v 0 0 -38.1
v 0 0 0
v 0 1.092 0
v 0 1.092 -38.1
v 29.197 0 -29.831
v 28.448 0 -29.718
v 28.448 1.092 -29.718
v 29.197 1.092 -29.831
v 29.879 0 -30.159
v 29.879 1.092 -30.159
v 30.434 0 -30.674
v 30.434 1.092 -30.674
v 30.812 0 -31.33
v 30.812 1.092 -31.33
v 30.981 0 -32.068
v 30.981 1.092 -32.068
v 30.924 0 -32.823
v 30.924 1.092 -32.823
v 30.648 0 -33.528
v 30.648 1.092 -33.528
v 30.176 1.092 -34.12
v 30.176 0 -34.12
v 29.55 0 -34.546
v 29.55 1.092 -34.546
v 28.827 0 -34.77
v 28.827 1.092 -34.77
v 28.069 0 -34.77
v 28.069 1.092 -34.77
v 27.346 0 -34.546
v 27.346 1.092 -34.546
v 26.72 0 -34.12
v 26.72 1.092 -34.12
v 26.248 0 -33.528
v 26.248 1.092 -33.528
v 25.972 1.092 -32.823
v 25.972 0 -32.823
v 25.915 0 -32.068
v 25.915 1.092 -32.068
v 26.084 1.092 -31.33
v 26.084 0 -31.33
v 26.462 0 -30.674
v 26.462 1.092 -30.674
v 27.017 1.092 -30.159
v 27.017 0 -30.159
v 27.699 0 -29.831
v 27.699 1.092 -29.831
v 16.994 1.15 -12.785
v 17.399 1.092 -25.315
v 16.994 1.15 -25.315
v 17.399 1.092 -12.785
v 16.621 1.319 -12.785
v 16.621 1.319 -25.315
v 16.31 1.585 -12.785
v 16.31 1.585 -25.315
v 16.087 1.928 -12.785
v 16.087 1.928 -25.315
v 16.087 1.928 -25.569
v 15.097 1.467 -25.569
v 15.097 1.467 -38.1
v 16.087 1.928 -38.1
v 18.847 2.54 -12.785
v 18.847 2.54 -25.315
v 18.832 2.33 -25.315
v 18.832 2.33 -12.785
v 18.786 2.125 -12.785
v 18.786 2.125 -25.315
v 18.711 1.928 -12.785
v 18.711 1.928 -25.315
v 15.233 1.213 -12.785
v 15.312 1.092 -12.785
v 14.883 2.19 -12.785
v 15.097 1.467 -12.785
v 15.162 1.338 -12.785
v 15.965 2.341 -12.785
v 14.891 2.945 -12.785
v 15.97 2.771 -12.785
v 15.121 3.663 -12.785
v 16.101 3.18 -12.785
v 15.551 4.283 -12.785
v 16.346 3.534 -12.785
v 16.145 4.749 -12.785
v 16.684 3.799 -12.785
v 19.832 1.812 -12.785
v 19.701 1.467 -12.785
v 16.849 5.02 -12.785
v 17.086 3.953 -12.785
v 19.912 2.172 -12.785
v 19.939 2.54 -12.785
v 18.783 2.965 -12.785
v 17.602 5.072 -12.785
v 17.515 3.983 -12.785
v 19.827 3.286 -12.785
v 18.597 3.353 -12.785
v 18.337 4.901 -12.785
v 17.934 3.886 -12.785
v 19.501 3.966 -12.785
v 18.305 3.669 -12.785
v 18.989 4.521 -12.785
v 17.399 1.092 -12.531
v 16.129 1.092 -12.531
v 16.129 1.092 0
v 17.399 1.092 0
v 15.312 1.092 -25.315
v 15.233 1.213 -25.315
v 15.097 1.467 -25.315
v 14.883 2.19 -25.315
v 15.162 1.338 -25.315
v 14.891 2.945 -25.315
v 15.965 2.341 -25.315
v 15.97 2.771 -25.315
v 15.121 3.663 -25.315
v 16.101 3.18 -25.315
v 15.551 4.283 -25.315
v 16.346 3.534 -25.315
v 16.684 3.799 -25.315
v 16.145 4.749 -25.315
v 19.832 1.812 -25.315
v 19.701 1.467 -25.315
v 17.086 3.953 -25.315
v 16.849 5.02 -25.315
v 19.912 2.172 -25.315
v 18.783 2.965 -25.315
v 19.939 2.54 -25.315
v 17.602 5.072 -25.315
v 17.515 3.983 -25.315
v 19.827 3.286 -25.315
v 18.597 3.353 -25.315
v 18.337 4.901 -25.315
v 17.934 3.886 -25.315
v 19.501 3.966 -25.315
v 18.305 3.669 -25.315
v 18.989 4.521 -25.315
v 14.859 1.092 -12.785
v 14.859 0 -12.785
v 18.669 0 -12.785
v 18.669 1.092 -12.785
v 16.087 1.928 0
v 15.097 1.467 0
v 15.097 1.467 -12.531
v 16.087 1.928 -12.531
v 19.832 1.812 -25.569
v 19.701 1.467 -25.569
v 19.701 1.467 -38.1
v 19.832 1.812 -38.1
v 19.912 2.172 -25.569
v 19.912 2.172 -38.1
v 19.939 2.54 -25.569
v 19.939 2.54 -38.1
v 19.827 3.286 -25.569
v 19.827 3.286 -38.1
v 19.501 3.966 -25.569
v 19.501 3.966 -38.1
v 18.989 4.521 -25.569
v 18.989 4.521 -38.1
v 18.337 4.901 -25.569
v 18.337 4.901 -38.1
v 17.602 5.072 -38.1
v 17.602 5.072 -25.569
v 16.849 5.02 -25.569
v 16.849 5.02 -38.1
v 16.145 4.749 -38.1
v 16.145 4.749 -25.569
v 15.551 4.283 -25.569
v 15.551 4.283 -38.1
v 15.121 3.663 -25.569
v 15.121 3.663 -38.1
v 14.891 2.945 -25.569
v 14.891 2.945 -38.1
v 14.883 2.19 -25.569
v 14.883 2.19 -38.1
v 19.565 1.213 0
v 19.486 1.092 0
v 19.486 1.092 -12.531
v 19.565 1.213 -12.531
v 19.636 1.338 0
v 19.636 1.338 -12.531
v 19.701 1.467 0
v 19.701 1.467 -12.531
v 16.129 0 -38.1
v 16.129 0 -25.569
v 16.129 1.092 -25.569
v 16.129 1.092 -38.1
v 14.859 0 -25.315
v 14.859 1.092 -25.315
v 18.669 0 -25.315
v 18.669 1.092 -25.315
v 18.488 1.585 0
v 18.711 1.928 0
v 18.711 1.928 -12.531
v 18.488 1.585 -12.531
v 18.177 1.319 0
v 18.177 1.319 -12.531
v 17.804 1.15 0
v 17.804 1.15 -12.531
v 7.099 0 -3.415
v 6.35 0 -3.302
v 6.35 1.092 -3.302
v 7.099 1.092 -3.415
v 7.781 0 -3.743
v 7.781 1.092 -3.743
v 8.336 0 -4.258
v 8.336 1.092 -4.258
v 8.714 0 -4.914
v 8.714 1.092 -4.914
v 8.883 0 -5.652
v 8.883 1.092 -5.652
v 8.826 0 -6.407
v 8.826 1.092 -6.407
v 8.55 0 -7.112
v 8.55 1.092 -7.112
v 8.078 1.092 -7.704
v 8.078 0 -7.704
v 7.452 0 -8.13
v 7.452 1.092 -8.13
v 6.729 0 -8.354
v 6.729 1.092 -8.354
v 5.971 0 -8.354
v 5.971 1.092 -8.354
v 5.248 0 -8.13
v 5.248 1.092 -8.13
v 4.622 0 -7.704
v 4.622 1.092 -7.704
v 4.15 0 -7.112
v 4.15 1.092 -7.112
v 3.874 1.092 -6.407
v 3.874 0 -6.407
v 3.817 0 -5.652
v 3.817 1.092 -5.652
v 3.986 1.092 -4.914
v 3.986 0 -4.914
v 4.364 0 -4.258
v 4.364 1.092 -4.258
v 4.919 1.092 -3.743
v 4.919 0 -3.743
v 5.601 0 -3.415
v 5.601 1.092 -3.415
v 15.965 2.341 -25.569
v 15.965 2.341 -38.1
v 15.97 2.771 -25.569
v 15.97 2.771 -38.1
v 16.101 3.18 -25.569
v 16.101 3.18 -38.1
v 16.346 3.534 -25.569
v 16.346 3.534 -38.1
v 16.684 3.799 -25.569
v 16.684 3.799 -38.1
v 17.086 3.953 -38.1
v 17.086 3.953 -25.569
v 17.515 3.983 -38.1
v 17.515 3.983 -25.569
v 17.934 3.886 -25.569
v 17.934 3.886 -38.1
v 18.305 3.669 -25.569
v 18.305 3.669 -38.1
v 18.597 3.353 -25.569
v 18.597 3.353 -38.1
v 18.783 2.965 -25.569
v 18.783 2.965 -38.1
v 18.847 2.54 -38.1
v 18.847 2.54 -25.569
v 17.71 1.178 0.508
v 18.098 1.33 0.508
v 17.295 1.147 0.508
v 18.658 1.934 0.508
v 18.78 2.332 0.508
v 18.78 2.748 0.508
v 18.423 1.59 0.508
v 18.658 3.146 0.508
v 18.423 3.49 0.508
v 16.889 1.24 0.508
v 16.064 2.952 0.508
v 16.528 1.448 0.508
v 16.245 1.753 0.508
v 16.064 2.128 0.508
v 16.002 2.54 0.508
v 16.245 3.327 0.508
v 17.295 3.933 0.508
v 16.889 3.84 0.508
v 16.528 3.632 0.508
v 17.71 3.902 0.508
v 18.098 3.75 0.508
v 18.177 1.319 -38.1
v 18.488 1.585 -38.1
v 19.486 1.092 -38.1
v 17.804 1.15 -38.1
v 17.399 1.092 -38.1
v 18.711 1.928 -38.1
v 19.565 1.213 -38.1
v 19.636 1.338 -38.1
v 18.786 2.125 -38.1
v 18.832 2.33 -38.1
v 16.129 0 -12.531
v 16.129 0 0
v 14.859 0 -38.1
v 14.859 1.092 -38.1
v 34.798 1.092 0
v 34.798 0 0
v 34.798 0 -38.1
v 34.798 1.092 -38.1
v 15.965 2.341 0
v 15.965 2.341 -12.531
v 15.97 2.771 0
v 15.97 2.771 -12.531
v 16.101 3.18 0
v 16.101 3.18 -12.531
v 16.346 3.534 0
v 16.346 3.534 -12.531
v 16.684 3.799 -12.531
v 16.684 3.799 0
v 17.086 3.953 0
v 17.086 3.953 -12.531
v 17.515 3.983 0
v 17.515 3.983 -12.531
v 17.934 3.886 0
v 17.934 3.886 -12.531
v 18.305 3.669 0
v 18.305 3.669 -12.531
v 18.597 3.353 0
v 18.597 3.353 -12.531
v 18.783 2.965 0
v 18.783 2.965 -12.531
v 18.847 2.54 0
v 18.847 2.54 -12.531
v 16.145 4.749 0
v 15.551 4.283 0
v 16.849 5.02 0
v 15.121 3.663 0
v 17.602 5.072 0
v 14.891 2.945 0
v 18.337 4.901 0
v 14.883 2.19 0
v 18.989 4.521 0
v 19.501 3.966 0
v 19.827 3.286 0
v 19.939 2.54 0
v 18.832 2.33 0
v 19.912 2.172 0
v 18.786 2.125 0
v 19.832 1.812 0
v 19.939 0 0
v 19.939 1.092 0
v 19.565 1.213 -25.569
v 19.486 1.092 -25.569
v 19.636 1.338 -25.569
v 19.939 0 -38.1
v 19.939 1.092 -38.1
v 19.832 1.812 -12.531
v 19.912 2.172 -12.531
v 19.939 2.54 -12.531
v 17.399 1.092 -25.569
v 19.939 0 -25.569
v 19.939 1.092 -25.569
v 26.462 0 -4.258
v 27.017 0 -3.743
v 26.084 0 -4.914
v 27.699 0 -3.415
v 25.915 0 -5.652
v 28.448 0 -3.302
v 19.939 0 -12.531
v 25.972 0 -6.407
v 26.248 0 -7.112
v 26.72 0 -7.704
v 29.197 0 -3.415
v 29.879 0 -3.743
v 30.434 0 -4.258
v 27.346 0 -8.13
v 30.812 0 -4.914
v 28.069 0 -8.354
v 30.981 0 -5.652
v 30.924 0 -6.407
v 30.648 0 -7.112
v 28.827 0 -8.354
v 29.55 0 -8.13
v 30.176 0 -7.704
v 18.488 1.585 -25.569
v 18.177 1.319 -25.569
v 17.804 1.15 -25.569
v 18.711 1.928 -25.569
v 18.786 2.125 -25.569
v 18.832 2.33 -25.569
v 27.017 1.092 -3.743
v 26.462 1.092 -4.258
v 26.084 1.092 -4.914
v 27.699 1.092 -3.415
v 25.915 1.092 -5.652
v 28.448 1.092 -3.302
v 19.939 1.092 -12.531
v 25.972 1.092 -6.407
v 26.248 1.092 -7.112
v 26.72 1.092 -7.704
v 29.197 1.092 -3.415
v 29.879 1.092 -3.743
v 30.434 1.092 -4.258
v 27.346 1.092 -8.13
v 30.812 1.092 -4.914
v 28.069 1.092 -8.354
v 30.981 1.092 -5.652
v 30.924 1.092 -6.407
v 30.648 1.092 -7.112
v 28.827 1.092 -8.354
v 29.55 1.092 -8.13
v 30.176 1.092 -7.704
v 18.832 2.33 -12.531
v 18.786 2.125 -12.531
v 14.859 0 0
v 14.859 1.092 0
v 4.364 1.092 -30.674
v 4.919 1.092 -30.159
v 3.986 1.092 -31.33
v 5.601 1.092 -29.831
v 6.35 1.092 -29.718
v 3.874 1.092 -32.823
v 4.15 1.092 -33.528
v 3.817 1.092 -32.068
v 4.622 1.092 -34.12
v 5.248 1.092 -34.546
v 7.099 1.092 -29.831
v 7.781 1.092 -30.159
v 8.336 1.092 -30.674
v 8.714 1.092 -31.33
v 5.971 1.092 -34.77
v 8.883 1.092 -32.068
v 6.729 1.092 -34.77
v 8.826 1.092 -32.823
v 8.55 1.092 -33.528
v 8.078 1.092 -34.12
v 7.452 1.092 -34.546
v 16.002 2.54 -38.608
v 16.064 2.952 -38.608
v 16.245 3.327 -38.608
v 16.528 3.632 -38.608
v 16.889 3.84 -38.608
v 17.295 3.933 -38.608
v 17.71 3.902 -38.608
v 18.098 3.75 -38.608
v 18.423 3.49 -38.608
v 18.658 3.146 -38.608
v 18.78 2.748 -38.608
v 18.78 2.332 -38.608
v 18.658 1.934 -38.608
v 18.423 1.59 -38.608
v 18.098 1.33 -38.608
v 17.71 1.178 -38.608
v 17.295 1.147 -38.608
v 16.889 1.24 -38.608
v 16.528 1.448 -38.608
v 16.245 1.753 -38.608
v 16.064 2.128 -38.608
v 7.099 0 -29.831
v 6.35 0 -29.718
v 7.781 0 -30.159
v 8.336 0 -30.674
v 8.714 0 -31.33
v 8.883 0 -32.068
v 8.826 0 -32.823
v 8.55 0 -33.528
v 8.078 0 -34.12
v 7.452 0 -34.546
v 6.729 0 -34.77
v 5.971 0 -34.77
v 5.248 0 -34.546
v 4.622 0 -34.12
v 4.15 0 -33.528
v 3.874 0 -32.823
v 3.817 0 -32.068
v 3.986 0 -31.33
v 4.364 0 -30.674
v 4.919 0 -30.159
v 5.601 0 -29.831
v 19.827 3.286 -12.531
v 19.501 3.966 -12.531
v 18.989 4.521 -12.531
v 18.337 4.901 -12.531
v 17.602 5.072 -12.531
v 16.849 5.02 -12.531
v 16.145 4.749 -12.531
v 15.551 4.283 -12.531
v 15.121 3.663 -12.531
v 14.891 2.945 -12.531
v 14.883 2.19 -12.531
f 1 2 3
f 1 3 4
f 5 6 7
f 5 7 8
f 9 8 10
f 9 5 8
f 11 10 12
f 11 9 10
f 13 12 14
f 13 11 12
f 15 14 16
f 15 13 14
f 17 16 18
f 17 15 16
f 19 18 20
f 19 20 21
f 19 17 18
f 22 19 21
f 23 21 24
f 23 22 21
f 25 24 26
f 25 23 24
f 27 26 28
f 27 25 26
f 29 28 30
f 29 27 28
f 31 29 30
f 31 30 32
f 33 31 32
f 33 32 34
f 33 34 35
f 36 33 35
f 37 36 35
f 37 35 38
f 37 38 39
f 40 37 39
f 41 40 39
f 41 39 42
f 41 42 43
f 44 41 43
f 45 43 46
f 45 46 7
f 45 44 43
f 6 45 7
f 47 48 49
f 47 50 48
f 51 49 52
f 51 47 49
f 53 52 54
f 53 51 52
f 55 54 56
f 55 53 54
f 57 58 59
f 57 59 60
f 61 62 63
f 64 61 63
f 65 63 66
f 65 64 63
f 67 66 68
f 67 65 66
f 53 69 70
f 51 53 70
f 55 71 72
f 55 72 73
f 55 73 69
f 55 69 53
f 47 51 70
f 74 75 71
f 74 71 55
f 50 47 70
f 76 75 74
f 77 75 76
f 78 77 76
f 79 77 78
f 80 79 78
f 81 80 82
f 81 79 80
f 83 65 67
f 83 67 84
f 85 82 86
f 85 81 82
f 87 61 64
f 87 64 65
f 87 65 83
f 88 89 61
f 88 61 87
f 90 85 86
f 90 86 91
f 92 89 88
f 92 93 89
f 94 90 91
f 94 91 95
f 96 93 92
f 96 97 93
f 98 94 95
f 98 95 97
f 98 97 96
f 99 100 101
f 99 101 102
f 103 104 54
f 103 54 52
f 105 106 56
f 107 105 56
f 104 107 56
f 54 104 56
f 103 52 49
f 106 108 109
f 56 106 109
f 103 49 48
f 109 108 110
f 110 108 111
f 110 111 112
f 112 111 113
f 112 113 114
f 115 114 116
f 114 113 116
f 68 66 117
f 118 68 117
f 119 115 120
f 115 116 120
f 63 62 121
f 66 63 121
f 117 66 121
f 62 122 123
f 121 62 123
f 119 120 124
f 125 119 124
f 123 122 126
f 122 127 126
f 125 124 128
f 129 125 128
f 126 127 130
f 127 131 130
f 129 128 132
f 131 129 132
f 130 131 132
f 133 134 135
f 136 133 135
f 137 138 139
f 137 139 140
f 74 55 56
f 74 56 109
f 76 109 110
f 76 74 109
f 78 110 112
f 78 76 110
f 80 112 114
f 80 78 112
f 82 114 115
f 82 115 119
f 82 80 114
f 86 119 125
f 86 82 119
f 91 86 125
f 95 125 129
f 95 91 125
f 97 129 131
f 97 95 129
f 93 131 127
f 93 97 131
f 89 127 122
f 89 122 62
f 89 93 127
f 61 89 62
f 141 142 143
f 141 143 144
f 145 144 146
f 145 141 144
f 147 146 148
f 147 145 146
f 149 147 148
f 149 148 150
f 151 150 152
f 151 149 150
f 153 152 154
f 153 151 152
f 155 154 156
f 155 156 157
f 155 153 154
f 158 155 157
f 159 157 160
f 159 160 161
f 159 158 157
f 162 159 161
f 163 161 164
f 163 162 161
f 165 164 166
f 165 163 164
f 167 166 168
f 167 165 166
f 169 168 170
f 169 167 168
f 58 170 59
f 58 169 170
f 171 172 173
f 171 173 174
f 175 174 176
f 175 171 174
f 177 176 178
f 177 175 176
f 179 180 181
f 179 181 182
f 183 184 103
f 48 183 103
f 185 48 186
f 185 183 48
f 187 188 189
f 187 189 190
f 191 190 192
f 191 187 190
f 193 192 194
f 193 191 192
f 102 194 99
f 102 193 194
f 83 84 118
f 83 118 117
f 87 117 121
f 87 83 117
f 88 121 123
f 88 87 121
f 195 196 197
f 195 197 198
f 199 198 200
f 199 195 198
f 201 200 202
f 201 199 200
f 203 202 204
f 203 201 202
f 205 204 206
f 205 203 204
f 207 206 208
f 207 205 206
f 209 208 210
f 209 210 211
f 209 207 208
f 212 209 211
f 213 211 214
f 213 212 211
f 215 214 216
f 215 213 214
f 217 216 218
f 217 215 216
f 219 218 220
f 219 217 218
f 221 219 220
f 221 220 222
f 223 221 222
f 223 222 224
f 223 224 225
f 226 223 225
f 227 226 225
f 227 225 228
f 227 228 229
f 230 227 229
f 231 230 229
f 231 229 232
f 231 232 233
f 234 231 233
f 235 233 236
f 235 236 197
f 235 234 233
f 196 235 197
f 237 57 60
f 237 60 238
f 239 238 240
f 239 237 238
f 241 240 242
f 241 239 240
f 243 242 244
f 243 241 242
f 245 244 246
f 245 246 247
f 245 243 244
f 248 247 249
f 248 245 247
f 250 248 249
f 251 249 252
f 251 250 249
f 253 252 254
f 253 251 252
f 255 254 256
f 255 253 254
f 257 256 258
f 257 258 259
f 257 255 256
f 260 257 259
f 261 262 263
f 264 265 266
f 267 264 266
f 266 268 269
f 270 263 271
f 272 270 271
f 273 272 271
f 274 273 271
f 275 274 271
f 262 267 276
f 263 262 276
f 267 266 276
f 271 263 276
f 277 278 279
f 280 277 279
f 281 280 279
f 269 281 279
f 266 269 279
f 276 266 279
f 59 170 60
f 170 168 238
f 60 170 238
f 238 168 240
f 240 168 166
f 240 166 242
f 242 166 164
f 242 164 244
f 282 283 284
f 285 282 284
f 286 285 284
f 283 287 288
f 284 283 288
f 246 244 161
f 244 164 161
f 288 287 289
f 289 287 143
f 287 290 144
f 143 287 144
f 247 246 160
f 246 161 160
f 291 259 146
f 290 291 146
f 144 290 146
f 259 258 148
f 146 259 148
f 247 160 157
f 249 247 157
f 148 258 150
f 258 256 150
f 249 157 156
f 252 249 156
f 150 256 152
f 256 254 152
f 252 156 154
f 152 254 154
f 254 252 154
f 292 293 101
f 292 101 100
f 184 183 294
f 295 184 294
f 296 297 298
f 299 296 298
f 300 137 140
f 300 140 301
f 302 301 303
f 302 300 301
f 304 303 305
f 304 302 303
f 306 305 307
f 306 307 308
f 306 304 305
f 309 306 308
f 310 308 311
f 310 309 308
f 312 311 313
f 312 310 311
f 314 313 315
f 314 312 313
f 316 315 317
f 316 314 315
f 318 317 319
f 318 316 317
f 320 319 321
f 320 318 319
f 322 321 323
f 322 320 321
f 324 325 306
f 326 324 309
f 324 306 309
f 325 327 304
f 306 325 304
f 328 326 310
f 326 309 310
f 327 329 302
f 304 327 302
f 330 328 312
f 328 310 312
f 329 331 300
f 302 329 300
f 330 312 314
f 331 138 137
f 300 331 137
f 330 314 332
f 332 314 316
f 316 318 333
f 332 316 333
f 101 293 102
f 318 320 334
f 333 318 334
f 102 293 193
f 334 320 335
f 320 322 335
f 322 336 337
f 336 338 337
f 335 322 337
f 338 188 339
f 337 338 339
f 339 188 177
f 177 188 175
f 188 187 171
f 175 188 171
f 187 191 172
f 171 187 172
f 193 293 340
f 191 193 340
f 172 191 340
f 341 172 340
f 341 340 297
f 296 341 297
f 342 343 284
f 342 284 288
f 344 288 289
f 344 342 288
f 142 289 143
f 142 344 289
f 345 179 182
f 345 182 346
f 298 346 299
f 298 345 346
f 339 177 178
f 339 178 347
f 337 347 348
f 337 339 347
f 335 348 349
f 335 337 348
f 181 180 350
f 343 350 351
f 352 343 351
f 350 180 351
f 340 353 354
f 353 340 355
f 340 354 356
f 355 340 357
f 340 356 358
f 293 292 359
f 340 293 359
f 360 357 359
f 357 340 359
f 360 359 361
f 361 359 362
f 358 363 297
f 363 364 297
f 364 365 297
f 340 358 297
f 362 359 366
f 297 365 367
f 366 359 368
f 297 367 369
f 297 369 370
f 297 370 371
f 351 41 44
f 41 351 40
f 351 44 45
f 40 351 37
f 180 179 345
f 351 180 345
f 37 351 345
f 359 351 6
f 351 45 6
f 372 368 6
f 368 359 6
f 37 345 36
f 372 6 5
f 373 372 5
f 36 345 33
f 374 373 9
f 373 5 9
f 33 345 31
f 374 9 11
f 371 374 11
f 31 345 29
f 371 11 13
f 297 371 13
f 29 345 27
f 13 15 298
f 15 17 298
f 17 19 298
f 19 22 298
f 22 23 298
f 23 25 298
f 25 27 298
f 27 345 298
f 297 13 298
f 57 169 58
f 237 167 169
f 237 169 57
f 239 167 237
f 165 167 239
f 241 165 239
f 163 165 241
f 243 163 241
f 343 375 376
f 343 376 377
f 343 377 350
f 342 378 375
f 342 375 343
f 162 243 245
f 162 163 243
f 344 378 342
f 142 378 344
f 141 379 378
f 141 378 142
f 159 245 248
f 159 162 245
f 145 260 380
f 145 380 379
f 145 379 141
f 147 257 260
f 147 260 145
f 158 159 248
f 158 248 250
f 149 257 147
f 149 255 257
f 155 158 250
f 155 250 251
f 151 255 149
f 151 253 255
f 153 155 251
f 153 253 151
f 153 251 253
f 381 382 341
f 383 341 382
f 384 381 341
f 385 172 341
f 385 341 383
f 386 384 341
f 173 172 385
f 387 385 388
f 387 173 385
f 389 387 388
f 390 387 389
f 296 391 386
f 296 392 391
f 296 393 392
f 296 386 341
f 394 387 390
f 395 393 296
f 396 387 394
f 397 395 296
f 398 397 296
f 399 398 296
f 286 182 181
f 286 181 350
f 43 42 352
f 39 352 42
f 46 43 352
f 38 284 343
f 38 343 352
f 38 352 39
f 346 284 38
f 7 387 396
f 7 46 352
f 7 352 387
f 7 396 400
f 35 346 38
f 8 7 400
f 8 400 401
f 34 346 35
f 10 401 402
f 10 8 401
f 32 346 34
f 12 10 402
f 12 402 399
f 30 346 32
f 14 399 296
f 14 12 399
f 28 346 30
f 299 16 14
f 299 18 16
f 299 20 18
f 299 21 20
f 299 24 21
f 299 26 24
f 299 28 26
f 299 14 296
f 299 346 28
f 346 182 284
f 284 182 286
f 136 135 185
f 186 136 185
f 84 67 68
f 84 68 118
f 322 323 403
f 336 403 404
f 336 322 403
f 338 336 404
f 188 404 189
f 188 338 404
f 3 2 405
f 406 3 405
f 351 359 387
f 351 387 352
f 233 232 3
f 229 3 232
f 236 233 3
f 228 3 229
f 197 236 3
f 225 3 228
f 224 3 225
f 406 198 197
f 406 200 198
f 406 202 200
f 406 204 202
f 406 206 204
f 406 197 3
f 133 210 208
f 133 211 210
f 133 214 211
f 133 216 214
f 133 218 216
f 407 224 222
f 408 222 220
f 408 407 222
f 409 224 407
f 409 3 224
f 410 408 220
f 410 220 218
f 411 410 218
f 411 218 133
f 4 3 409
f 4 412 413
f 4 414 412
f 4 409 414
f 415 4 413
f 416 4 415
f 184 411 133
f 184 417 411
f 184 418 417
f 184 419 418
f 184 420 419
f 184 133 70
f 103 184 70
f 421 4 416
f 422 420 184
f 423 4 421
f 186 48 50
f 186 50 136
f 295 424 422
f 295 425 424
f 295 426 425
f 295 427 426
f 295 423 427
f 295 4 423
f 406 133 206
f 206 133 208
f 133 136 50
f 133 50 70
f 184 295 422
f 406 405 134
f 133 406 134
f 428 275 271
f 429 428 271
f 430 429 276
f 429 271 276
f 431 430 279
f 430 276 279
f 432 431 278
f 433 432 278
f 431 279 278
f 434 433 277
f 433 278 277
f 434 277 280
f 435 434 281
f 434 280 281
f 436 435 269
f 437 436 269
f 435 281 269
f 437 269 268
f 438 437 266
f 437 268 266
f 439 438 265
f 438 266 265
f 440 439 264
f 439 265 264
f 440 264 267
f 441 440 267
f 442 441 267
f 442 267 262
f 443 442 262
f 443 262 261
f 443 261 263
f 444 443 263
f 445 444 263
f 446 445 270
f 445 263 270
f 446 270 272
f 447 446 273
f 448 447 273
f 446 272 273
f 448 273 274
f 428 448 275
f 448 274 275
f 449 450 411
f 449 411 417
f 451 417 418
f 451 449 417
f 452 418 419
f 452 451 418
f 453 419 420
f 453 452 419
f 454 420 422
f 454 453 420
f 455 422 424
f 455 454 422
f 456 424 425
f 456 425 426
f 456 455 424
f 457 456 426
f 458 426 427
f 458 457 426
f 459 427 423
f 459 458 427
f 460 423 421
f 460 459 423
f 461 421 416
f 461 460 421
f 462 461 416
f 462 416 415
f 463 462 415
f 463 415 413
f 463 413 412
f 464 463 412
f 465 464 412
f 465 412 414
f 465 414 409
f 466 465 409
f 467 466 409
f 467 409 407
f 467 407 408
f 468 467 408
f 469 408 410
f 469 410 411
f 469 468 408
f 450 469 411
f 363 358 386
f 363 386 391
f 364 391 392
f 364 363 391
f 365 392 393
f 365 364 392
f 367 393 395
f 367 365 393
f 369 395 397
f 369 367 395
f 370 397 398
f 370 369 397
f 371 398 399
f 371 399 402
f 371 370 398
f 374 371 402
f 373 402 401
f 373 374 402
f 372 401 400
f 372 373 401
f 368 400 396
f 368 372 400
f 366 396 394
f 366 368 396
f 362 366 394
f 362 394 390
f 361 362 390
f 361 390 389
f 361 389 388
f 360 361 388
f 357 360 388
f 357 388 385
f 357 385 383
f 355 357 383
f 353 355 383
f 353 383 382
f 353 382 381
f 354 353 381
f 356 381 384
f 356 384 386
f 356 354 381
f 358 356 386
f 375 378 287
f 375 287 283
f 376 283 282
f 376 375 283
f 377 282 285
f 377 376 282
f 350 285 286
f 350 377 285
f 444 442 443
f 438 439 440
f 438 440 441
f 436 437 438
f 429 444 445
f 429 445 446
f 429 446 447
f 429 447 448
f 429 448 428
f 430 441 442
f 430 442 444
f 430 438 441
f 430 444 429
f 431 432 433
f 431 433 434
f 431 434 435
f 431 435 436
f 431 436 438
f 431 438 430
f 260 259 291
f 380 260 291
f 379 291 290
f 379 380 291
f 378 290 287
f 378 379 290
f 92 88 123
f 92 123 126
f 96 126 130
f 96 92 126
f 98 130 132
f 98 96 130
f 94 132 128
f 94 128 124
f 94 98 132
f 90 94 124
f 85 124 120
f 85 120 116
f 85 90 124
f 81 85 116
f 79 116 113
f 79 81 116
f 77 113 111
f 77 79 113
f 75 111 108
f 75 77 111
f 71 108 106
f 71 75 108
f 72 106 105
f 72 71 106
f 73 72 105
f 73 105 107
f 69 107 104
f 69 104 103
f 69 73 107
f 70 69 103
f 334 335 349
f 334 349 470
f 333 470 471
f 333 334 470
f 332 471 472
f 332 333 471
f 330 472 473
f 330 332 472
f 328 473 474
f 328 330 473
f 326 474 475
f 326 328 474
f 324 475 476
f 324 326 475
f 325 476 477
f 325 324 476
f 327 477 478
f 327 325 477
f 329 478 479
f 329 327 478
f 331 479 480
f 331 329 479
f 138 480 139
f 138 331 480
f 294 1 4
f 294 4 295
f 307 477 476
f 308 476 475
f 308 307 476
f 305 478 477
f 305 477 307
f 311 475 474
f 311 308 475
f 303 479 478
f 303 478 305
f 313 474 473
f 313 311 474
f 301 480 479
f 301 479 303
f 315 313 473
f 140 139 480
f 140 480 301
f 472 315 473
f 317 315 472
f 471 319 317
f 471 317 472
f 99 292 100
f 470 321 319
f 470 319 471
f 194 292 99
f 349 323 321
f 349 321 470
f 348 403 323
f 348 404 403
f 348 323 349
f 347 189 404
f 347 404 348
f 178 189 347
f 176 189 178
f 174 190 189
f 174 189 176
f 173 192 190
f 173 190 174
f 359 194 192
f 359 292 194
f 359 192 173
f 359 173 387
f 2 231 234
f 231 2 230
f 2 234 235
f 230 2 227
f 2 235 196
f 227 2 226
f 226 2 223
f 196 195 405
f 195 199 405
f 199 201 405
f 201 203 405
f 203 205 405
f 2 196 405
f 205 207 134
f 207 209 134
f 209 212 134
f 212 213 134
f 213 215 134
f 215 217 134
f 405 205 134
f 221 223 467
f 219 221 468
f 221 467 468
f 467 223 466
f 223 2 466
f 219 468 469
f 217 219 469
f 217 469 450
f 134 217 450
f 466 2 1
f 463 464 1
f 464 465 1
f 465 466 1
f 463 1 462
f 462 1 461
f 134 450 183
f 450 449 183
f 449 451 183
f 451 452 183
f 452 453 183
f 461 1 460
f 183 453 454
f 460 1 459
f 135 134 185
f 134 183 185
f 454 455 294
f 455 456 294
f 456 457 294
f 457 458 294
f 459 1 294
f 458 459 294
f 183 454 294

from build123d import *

# Parameters (mm, degrees)
SKETCH1_W           = 14.859
SKETCH1_H           = 38.1
SKETCH1_R           = 2.54
SKETCH1_W_2         = 3.81
SKETCH1_H_2         = 12.530666666
SKETCH1_H_3         = 12.530666667
BOSS_EXTRUDE1_DEPTH = 1.0922
BOSS_EXTRUDE3_DEPTH = 12.530666667
BOSS_EXTRUDE4_START = -25.569333
BOSS_EXTRUDE4_DEPTH = 12.530666667
BOSS_EXTRUDE5_START = -12.784667
BOSS_EXTRUDE5_DEPTH = 12.530666667
BOSS_EXTRUDE6_START = -38.608
SKETCH3_R           = 1.397
BOSS_EXTRUDE6_DEPTH = 39.116


with BuildPart() as part:
    # Sketch1 → Boss-Extrude1 (new body)
    # profile 1 of 5: a face of its own
    with BuildSketch(Plane(origin=(0, 0, 0), x_dir=(1, 0, 0), z_dir=(0, 1, 0))):
        with Locations((7.4295, 19.05)):
            Rectangle(SKETCH1_W, SKETCH1_H)
        with Locations(Location((6.35, 5.842, 0), (0, 0, 270))):
            Circle(SKETCH1_R, mode=Mode.SUBTRACT)
        with Locations(Location((6.35, 32.258, 0), (0, 0, 270))):
            Circle(SKETCH1_R, mode=Mode.SUBTRACT)
    # profile 2 of 5: a face of its own
    with BuildSketch(Plane(origin=(0, 0, 0), x_dir=(1, 0, 0), z_dir=(0, 1, 0))):
        with Locations((27.3685, 19.05)):
            Rectangle(SKETCH1_W, SKETCH1_H)
        with Locations(Location((28.448, 5.842, 0), (0, 0, 270))):
            Circle(SKETCH1_R, mode=Mode.SUBTRACT)
        with Locations(Location((28.448, 32.258, 0), (0, 0, 270))):
            Circle(SKETCH1_R, mode=Mode.SUBTRACT)
    # profile 3 of 5: a face of its own
    with BuildSketch(Plane(origin=(0, 0, 0), x_dir=(1, 0, 0), z_dir=(0, 1, 0))):
        with Locations((16.764, 19.05)):
            Rectangle(SKETCH1_W_2, SKETCH1_H_2)
    # profile 4 of 5: a face of its own
    with BuildSketch(Plane(origin=(0, 0, 0), x_dir=(1, 0, 0), z_dir=(0, 1, 0))):
        with Locations((18.034, 31.834666667)):
            Rectangle(SKETCH1_W_2, SKETCH1_H_3)
    # profile 5 of 5: a face of its own
    with BuildSketch(Plane(origin=(0, 0, 0), x_dir=(1, 0, 0), z_dir=(0, 1, 0))):
        with Locations((18.034, 6.265333334)):
            Rectangle(SKETCH1_W_2, SKETCH1_H_3)
    extrude(amount=BOSS_EXTRUDE1_DEPTH)

    # Sketch2 → Boss-Extrude3 (add)
    with BuildSketch(Plane.XY):
        with BuildLine():
            ThreePointArc((18.711152414, 1.928133281), (18.176902373, 1.318937865), (17.399, 1.0922))
            Line((17.399, 1.0922), (19.485977518, 1.0922))
            ThreePointArc((19.485977518, 1.0922), (19.601467506, 1.27479769), (19.701021779, 1.466549615))
            Line((19.701021779, 1.466549615), (18.711152414, 1.928133281))
        make_face()
        with BuildLine():
            Line((15.096978221, 1.466549615), (16.086847586, 1.928133281))
            ThreePointArc((16.086847586, 1.928133281), (17.085638727, 3.953481359), (18.8468, 2.54))
            ThreePointArc((18.8468, 2.54), (18.812481359, 2.226638727), (18.711152414, 1.928133281))
            Line((18.711152414, 1.928133281), (19.701021779, 1.466549615))
            ThreePointArc((19.701021779, 1.466549615), (19.878791858, 1.990243381), (19.939, 2.54))
            ThreePointArc((19.939, 2.54), (16.849243381, 5.019791858), (15.096978221, 1.466549615))
        make_face()
    extrude(amount=-BOSS_EXTRUDE3_DEPTH)

    # Sketch2<4> → Boss-Extrude4 (add)
    with BuildSketch(Plane.XY.offset(BOSS_EXTRUDE4_START)):
        with BuildLine():
            ThreePointArc((18.711152414, 1.928133281), (18.176902373, 1.318937865), (17.399, 1.0922))
            Line((17.399, 1.0922), (19.485977518, 1.0922))
            ThreePointArc((19.485977518, 1.0922), (19.601467506, 1.27479769), (19.701021779, 1.466549615))
            Line((19.701021779, 1.466549615), (18.711152414, 1.928133281))
        make_face()
        with BuildLine():
            Line((15.096978221, 1.466549615), (16.086847586, 1.928133281))
            ThreePointArc((16.086847586, 1.928133281), (17.085638727, 3.953481359), (18.8468, 2.54))
            ThreePointArc((18.8468, 2.54), (18.812481359, 2.226638727), (18.711152414, 1.928133281))
            Line((18.711152414, 1.928133281), (19.701021779, 1.466549615))
            ThreePointArc((19.701021779, 1.466549615), (19.878791858, 1.990243381), (19.939, 2.54))
            ThreePointArc((19.939, 2.54), (16.849243381, 5.019791858), (15.096978221, 1.466549615))
        make_face()
    extrude(amount=-BOSS_EXTRUDE4_DEPTH)

    # Sketch2<5> → Boss-Extrude5 (add)
    with BuildSketch(Plane.XY.offset(BOSS_EXTRUDE5_START)):
        with BuildLine():
            Line((16.129, 1.0922), (17.399, 1.0922))
            ThreePointArc((17.399, 1.0922), (16.621097627, 1.318937865), (16.086847586, 1.928133281))
            Line((16.086847586, 1.928133281), (15.096978221, 1.466549615))
            ThreePointArc((15.096978221, 1.466549615), (15.196532494, 1.27479769), (15.312022482, 1.0922))
            Line((15.312022482, 1.0922), (16.129, 1.0922))
        make_face()
        with BuildLine():
            Line((15.096978221, 1.466549615), (16.086847586, 1.928133281))
            ThreePointArc((16.086847586, 1.928133281), (17.085638727, 3.953481359), (18.8468, 2.54))
            ThreePointArc((18.8468, 2.54), (18.812481359, 2.226638727), (18.711152414, 1.928133281))
            Line((18.711152414, 1.928133281), (19.701021779, 1.466549615))
            ThreePointArc((19.701021779, 1.466549615), (19.878791858, 1.990243381), (19.939, 2.54))
            ThreePointArc((19.939, 2.54), (16.849243381, 5.019791858), (15.096978221, 1.466549615))
        make_face()
    extrude(amount=-BOSS_EXTRUDE5_DEPTH)


with BuildPart() as body_2:
    # Sketch3 → Boss-Extrude6 (new body)
    with BuildSketch(Plane(origin=(0, 0, -38.1), x_dir=(-1, 0, 0), z_dir=(0, 0, -1)).offset(BOSS_EXTRUDE6_START)):
        with Locations((-17.399, 2.54)):
            Circle(SKETCH3_R)
    extrude(amount=BOSS_EXTRUDE6_DEPTH)


solid = Compound([part.part, body_2.part])
